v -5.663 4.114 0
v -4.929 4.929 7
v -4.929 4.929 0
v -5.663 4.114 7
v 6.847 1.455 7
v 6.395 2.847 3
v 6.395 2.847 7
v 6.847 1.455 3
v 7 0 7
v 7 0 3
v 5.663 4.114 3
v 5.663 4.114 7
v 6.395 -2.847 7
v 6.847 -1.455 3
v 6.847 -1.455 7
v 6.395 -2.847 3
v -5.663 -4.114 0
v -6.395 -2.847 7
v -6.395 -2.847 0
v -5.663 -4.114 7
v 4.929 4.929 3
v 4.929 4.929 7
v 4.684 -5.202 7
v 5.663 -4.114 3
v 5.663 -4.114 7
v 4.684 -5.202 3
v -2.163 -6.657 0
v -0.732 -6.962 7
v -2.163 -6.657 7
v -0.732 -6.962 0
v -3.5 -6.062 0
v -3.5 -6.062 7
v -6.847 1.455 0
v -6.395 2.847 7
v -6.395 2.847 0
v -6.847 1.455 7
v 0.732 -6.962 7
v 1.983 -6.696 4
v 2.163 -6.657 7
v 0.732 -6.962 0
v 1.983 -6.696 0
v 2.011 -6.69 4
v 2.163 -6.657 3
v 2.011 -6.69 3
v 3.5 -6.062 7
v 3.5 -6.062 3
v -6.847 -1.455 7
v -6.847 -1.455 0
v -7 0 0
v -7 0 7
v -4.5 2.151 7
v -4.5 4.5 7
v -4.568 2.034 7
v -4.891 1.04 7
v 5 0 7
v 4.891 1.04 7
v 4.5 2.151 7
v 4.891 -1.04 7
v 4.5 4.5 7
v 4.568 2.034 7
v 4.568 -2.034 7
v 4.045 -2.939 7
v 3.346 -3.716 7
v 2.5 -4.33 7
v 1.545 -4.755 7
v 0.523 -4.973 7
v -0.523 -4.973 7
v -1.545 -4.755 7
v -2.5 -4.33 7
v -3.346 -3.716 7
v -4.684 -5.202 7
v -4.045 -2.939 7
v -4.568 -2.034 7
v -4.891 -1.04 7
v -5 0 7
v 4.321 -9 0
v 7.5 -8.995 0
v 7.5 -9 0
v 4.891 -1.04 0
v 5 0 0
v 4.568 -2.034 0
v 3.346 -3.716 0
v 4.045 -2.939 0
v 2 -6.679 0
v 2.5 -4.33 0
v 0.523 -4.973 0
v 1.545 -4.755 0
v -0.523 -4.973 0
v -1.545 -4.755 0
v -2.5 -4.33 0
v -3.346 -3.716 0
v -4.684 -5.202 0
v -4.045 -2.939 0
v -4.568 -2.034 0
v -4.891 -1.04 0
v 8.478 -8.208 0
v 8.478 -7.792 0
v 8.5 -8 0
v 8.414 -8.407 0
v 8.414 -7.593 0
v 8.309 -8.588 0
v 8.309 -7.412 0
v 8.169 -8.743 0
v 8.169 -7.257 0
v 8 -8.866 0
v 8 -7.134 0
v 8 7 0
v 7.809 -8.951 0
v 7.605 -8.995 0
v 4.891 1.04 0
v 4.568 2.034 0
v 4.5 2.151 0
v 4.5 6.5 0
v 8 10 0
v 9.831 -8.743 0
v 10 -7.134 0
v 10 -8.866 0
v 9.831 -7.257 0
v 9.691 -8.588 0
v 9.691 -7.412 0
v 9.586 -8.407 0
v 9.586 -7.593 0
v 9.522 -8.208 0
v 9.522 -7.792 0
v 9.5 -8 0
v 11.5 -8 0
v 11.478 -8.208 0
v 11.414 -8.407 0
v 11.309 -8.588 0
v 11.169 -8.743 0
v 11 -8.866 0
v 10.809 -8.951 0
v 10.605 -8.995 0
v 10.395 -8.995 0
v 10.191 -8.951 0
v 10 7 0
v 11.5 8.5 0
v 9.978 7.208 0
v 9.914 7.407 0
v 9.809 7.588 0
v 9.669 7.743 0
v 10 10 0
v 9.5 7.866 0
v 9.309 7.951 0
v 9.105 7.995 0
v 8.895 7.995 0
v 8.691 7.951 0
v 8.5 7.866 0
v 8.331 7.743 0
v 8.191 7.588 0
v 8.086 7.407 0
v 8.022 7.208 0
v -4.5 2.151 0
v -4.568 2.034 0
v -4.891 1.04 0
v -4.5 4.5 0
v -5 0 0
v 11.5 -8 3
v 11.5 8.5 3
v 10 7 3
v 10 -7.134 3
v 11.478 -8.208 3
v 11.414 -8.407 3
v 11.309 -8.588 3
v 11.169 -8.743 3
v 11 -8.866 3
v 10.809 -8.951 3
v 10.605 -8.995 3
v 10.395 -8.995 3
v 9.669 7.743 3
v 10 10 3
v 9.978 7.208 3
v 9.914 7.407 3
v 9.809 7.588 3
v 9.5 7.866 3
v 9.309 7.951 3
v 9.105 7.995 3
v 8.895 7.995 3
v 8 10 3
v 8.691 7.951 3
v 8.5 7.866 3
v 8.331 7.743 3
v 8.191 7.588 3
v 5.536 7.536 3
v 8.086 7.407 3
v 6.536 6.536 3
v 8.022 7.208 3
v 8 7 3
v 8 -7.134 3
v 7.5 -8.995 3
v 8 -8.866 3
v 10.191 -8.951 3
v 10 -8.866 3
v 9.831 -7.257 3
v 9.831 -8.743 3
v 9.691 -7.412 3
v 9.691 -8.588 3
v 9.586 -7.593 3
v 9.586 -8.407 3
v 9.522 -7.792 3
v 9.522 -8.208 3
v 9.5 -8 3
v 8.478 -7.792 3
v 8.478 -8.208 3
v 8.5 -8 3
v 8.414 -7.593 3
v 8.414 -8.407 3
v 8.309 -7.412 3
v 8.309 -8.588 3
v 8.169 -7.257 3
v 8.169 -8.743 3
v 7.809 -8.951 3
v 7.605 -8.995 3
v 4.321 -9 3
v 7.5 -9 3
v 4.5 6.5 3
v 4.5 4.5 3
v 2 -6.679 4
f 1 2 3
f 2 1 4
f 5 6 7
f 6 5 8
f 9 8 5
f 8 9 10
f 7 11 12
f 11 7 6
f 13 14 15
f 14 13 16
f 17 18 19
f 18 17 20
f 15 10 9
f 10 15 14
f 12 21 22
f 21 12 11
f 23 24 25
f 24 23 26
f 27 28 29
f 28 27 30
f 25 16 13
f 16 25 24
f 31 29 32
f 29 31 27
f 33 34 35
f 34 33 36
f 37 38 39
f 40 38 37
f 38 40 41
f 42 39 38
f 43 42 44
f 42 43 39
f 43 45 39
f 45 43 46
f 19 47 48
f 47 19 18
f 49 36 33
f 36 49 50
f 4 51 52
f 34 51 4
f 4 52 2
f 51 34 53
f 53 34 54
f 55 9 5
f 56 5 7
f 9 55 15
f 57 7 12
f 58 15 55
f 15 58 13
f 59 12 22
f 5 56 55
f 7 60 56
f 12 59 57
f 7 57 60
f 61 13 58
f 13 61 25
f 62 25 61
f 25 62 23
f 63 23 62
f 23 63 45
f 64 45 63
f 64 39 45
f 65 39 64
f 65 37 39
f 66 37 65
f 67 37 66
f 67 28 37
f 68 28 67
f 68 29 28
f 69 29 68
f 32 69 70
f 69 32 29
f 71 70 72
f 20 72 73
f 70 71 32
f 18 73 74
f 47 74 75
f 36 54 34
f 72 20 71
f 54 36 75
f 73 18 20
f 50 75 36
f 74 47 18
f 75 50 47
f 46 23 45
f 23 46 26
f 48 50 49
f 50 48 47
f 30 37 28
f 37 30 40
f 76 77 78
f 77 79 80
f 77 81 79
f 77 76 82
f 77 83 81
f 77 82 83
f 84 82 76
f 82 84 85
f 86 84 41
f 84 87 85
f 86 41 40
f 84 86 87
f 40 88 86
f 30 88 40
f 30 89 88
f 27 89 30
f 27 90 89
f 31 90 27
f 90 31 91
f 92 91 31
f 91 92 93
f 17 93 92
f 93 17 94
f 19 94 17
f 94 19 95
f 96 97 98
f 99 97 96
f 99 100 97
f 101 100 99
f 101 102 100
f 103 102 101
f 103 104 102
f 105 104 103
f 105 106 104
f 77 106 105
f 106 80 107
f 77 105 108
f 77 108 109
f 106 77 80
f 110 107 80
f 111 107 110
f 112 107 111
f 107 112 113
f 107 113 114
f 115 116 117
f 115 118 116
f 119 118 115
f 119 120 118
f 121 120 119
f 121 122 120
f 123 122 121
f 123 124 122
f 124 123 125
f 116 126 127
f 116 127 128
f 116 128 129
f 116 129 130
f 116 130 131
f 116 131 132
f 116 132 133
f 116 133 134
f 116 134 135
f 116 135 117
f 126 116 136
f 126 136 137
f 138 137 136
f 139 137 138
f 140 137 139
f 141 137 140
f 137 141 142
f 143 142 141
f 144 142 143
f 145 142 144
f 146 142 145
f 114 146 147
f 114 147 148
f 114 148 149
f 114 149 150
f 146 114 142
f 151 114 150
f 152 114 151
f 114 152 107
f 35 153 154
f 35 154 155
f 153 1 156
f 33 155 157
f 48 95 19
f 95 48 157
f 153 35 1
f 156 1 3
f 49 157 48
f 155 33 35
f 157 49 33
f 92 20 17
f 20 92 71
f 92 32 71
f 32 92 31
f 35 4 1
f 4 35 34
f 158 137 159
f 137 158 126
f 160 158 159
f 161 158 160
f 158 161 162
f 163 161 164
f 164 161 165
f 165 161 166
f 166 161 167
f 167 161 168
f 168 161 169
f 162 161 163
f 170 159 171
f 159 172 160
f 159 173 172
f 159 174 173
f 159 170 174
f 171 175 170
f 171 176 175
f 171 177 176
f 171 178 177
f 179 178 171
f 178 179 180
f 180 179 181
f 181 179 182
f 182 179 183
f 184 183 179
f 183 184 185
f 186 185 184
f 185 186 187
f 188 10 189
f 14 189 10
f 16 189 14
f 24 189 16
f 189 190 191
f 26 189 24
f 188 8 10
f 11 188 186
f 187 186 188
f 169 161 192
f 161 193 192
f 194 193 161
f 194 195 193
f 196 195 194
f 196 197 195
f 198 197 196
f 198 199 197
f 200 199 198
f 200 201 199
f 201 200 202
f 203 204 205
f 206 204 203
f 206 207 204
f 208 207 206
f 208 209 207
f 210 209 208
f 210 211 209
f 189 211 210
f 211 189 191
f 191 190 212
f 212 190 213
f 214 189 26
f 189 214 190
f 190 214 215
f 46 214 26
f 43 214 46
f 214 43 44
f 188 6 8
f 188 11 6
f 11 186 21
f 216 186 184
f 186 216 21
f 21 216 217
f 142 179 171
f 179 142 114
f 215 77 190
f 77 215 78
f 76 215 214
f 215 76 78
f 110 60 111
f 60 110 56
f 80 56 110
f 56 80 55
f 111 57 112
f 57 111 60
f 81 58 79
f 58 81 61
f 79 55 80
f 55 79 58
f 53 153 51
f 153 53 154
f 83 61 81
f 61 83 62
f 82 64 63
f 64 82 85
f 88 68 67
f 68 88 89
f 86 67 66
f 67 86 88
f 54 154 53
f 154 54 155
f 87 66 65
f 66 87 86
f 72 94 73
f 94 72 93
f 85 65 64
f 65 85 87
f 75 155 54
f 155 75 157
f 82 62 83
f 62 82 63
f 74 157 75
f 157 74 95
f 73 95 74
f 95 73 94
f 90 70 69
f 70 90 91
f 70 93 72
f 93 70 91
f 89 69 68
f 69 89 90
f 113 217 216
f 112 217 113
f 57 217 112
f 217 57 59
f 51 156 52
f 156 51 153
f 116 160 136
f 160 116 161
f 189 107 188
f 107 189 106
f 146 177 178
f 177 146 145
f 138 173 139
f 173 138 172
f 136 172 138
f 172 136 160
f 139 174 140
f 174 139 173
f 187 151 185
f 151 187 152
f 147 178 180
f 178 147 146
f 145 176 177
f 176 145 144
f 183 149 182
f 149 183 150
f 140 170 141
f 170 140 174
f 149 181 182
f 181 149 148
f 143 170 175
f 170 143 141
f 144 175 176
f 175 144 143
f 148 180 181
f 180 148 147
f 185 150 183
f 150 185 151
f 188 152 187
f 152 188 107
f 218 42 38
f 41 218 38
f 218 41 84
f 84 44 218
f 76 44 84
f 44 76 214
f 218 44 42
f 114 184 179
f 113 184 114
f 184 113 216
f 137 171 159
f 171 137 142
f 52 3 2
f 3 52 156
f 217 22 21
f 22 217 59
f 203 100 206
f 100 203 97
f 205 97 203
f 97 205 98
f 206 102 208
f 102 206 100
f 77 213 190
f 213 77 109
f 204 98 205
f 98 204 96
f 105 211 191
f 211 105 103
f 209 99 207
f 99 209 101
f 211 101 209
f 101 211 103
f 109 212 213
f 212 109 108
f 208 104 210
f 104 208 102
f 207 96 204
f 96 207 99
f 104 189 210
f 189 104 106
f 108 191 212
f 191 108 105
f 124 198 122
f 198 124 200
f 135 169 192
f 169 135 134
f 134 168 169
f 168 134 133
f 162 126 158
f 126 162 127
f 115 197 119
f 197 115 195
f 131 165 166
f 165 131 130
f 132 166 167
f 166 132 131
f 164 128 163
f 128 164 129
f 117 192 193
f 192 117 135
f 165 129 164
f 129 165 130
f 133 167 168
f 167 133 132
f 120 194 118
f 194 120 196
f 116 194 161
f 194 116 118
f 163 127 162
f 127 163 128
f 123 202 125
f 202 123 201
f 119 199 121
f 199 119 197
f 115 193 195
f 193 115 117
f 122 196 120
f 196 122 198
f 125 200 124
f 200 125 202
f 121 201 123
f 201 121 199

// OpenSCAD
//Original Prusa

// PRUSA iteration3
// LCD cable clip
// GNU GPL v3
// Josef Průša <iam@josefprusa.cz> and contributors
// http://www.reprap.org/wiki/Prusa_Mendel
// http://prusamendel.org


difference(){
    union(){
    cylinder(r=7,h = 7, $fn=30);
    translate([2,-8,0]) cube([9.5,18,3]);
    translate([2,-9,0]) cube([5.5,5,3]);
    }
translate([0,0,-1]) cylinder(r=5,h = 10, $fn=30);
translate([-4.5,0,-5]) cube([9,15,15]);
translate([8,-12,-1]) cube([2,19,5]);
translate([9,7,-1]) cylinder(r=1,h = 5, $fn=30);
    
    //corners
    translate([2,-13.75,-1]) rotate([0,0,45]) cube([5,5,5]);    
    
    translate([4,6,-1]) rotate([0,0,45]) cube([10,10,5]);    
    translate([14,6,-1]) rotate([0,0,45]) cube([10,10,5]);    
    translate([-3,3,-1]) rotate([0,0,45]) cube([5,5,10]);    
    translate([3,3,3]) rotate([0,0,45]) cube([5,5,10]);    
}


translate([7.5,-8,0]) cylinder(r=1,h = 3, $fn=30);
translate([10.5,-8,0]) cylinder(r=1,h = 3, $fn=30);
